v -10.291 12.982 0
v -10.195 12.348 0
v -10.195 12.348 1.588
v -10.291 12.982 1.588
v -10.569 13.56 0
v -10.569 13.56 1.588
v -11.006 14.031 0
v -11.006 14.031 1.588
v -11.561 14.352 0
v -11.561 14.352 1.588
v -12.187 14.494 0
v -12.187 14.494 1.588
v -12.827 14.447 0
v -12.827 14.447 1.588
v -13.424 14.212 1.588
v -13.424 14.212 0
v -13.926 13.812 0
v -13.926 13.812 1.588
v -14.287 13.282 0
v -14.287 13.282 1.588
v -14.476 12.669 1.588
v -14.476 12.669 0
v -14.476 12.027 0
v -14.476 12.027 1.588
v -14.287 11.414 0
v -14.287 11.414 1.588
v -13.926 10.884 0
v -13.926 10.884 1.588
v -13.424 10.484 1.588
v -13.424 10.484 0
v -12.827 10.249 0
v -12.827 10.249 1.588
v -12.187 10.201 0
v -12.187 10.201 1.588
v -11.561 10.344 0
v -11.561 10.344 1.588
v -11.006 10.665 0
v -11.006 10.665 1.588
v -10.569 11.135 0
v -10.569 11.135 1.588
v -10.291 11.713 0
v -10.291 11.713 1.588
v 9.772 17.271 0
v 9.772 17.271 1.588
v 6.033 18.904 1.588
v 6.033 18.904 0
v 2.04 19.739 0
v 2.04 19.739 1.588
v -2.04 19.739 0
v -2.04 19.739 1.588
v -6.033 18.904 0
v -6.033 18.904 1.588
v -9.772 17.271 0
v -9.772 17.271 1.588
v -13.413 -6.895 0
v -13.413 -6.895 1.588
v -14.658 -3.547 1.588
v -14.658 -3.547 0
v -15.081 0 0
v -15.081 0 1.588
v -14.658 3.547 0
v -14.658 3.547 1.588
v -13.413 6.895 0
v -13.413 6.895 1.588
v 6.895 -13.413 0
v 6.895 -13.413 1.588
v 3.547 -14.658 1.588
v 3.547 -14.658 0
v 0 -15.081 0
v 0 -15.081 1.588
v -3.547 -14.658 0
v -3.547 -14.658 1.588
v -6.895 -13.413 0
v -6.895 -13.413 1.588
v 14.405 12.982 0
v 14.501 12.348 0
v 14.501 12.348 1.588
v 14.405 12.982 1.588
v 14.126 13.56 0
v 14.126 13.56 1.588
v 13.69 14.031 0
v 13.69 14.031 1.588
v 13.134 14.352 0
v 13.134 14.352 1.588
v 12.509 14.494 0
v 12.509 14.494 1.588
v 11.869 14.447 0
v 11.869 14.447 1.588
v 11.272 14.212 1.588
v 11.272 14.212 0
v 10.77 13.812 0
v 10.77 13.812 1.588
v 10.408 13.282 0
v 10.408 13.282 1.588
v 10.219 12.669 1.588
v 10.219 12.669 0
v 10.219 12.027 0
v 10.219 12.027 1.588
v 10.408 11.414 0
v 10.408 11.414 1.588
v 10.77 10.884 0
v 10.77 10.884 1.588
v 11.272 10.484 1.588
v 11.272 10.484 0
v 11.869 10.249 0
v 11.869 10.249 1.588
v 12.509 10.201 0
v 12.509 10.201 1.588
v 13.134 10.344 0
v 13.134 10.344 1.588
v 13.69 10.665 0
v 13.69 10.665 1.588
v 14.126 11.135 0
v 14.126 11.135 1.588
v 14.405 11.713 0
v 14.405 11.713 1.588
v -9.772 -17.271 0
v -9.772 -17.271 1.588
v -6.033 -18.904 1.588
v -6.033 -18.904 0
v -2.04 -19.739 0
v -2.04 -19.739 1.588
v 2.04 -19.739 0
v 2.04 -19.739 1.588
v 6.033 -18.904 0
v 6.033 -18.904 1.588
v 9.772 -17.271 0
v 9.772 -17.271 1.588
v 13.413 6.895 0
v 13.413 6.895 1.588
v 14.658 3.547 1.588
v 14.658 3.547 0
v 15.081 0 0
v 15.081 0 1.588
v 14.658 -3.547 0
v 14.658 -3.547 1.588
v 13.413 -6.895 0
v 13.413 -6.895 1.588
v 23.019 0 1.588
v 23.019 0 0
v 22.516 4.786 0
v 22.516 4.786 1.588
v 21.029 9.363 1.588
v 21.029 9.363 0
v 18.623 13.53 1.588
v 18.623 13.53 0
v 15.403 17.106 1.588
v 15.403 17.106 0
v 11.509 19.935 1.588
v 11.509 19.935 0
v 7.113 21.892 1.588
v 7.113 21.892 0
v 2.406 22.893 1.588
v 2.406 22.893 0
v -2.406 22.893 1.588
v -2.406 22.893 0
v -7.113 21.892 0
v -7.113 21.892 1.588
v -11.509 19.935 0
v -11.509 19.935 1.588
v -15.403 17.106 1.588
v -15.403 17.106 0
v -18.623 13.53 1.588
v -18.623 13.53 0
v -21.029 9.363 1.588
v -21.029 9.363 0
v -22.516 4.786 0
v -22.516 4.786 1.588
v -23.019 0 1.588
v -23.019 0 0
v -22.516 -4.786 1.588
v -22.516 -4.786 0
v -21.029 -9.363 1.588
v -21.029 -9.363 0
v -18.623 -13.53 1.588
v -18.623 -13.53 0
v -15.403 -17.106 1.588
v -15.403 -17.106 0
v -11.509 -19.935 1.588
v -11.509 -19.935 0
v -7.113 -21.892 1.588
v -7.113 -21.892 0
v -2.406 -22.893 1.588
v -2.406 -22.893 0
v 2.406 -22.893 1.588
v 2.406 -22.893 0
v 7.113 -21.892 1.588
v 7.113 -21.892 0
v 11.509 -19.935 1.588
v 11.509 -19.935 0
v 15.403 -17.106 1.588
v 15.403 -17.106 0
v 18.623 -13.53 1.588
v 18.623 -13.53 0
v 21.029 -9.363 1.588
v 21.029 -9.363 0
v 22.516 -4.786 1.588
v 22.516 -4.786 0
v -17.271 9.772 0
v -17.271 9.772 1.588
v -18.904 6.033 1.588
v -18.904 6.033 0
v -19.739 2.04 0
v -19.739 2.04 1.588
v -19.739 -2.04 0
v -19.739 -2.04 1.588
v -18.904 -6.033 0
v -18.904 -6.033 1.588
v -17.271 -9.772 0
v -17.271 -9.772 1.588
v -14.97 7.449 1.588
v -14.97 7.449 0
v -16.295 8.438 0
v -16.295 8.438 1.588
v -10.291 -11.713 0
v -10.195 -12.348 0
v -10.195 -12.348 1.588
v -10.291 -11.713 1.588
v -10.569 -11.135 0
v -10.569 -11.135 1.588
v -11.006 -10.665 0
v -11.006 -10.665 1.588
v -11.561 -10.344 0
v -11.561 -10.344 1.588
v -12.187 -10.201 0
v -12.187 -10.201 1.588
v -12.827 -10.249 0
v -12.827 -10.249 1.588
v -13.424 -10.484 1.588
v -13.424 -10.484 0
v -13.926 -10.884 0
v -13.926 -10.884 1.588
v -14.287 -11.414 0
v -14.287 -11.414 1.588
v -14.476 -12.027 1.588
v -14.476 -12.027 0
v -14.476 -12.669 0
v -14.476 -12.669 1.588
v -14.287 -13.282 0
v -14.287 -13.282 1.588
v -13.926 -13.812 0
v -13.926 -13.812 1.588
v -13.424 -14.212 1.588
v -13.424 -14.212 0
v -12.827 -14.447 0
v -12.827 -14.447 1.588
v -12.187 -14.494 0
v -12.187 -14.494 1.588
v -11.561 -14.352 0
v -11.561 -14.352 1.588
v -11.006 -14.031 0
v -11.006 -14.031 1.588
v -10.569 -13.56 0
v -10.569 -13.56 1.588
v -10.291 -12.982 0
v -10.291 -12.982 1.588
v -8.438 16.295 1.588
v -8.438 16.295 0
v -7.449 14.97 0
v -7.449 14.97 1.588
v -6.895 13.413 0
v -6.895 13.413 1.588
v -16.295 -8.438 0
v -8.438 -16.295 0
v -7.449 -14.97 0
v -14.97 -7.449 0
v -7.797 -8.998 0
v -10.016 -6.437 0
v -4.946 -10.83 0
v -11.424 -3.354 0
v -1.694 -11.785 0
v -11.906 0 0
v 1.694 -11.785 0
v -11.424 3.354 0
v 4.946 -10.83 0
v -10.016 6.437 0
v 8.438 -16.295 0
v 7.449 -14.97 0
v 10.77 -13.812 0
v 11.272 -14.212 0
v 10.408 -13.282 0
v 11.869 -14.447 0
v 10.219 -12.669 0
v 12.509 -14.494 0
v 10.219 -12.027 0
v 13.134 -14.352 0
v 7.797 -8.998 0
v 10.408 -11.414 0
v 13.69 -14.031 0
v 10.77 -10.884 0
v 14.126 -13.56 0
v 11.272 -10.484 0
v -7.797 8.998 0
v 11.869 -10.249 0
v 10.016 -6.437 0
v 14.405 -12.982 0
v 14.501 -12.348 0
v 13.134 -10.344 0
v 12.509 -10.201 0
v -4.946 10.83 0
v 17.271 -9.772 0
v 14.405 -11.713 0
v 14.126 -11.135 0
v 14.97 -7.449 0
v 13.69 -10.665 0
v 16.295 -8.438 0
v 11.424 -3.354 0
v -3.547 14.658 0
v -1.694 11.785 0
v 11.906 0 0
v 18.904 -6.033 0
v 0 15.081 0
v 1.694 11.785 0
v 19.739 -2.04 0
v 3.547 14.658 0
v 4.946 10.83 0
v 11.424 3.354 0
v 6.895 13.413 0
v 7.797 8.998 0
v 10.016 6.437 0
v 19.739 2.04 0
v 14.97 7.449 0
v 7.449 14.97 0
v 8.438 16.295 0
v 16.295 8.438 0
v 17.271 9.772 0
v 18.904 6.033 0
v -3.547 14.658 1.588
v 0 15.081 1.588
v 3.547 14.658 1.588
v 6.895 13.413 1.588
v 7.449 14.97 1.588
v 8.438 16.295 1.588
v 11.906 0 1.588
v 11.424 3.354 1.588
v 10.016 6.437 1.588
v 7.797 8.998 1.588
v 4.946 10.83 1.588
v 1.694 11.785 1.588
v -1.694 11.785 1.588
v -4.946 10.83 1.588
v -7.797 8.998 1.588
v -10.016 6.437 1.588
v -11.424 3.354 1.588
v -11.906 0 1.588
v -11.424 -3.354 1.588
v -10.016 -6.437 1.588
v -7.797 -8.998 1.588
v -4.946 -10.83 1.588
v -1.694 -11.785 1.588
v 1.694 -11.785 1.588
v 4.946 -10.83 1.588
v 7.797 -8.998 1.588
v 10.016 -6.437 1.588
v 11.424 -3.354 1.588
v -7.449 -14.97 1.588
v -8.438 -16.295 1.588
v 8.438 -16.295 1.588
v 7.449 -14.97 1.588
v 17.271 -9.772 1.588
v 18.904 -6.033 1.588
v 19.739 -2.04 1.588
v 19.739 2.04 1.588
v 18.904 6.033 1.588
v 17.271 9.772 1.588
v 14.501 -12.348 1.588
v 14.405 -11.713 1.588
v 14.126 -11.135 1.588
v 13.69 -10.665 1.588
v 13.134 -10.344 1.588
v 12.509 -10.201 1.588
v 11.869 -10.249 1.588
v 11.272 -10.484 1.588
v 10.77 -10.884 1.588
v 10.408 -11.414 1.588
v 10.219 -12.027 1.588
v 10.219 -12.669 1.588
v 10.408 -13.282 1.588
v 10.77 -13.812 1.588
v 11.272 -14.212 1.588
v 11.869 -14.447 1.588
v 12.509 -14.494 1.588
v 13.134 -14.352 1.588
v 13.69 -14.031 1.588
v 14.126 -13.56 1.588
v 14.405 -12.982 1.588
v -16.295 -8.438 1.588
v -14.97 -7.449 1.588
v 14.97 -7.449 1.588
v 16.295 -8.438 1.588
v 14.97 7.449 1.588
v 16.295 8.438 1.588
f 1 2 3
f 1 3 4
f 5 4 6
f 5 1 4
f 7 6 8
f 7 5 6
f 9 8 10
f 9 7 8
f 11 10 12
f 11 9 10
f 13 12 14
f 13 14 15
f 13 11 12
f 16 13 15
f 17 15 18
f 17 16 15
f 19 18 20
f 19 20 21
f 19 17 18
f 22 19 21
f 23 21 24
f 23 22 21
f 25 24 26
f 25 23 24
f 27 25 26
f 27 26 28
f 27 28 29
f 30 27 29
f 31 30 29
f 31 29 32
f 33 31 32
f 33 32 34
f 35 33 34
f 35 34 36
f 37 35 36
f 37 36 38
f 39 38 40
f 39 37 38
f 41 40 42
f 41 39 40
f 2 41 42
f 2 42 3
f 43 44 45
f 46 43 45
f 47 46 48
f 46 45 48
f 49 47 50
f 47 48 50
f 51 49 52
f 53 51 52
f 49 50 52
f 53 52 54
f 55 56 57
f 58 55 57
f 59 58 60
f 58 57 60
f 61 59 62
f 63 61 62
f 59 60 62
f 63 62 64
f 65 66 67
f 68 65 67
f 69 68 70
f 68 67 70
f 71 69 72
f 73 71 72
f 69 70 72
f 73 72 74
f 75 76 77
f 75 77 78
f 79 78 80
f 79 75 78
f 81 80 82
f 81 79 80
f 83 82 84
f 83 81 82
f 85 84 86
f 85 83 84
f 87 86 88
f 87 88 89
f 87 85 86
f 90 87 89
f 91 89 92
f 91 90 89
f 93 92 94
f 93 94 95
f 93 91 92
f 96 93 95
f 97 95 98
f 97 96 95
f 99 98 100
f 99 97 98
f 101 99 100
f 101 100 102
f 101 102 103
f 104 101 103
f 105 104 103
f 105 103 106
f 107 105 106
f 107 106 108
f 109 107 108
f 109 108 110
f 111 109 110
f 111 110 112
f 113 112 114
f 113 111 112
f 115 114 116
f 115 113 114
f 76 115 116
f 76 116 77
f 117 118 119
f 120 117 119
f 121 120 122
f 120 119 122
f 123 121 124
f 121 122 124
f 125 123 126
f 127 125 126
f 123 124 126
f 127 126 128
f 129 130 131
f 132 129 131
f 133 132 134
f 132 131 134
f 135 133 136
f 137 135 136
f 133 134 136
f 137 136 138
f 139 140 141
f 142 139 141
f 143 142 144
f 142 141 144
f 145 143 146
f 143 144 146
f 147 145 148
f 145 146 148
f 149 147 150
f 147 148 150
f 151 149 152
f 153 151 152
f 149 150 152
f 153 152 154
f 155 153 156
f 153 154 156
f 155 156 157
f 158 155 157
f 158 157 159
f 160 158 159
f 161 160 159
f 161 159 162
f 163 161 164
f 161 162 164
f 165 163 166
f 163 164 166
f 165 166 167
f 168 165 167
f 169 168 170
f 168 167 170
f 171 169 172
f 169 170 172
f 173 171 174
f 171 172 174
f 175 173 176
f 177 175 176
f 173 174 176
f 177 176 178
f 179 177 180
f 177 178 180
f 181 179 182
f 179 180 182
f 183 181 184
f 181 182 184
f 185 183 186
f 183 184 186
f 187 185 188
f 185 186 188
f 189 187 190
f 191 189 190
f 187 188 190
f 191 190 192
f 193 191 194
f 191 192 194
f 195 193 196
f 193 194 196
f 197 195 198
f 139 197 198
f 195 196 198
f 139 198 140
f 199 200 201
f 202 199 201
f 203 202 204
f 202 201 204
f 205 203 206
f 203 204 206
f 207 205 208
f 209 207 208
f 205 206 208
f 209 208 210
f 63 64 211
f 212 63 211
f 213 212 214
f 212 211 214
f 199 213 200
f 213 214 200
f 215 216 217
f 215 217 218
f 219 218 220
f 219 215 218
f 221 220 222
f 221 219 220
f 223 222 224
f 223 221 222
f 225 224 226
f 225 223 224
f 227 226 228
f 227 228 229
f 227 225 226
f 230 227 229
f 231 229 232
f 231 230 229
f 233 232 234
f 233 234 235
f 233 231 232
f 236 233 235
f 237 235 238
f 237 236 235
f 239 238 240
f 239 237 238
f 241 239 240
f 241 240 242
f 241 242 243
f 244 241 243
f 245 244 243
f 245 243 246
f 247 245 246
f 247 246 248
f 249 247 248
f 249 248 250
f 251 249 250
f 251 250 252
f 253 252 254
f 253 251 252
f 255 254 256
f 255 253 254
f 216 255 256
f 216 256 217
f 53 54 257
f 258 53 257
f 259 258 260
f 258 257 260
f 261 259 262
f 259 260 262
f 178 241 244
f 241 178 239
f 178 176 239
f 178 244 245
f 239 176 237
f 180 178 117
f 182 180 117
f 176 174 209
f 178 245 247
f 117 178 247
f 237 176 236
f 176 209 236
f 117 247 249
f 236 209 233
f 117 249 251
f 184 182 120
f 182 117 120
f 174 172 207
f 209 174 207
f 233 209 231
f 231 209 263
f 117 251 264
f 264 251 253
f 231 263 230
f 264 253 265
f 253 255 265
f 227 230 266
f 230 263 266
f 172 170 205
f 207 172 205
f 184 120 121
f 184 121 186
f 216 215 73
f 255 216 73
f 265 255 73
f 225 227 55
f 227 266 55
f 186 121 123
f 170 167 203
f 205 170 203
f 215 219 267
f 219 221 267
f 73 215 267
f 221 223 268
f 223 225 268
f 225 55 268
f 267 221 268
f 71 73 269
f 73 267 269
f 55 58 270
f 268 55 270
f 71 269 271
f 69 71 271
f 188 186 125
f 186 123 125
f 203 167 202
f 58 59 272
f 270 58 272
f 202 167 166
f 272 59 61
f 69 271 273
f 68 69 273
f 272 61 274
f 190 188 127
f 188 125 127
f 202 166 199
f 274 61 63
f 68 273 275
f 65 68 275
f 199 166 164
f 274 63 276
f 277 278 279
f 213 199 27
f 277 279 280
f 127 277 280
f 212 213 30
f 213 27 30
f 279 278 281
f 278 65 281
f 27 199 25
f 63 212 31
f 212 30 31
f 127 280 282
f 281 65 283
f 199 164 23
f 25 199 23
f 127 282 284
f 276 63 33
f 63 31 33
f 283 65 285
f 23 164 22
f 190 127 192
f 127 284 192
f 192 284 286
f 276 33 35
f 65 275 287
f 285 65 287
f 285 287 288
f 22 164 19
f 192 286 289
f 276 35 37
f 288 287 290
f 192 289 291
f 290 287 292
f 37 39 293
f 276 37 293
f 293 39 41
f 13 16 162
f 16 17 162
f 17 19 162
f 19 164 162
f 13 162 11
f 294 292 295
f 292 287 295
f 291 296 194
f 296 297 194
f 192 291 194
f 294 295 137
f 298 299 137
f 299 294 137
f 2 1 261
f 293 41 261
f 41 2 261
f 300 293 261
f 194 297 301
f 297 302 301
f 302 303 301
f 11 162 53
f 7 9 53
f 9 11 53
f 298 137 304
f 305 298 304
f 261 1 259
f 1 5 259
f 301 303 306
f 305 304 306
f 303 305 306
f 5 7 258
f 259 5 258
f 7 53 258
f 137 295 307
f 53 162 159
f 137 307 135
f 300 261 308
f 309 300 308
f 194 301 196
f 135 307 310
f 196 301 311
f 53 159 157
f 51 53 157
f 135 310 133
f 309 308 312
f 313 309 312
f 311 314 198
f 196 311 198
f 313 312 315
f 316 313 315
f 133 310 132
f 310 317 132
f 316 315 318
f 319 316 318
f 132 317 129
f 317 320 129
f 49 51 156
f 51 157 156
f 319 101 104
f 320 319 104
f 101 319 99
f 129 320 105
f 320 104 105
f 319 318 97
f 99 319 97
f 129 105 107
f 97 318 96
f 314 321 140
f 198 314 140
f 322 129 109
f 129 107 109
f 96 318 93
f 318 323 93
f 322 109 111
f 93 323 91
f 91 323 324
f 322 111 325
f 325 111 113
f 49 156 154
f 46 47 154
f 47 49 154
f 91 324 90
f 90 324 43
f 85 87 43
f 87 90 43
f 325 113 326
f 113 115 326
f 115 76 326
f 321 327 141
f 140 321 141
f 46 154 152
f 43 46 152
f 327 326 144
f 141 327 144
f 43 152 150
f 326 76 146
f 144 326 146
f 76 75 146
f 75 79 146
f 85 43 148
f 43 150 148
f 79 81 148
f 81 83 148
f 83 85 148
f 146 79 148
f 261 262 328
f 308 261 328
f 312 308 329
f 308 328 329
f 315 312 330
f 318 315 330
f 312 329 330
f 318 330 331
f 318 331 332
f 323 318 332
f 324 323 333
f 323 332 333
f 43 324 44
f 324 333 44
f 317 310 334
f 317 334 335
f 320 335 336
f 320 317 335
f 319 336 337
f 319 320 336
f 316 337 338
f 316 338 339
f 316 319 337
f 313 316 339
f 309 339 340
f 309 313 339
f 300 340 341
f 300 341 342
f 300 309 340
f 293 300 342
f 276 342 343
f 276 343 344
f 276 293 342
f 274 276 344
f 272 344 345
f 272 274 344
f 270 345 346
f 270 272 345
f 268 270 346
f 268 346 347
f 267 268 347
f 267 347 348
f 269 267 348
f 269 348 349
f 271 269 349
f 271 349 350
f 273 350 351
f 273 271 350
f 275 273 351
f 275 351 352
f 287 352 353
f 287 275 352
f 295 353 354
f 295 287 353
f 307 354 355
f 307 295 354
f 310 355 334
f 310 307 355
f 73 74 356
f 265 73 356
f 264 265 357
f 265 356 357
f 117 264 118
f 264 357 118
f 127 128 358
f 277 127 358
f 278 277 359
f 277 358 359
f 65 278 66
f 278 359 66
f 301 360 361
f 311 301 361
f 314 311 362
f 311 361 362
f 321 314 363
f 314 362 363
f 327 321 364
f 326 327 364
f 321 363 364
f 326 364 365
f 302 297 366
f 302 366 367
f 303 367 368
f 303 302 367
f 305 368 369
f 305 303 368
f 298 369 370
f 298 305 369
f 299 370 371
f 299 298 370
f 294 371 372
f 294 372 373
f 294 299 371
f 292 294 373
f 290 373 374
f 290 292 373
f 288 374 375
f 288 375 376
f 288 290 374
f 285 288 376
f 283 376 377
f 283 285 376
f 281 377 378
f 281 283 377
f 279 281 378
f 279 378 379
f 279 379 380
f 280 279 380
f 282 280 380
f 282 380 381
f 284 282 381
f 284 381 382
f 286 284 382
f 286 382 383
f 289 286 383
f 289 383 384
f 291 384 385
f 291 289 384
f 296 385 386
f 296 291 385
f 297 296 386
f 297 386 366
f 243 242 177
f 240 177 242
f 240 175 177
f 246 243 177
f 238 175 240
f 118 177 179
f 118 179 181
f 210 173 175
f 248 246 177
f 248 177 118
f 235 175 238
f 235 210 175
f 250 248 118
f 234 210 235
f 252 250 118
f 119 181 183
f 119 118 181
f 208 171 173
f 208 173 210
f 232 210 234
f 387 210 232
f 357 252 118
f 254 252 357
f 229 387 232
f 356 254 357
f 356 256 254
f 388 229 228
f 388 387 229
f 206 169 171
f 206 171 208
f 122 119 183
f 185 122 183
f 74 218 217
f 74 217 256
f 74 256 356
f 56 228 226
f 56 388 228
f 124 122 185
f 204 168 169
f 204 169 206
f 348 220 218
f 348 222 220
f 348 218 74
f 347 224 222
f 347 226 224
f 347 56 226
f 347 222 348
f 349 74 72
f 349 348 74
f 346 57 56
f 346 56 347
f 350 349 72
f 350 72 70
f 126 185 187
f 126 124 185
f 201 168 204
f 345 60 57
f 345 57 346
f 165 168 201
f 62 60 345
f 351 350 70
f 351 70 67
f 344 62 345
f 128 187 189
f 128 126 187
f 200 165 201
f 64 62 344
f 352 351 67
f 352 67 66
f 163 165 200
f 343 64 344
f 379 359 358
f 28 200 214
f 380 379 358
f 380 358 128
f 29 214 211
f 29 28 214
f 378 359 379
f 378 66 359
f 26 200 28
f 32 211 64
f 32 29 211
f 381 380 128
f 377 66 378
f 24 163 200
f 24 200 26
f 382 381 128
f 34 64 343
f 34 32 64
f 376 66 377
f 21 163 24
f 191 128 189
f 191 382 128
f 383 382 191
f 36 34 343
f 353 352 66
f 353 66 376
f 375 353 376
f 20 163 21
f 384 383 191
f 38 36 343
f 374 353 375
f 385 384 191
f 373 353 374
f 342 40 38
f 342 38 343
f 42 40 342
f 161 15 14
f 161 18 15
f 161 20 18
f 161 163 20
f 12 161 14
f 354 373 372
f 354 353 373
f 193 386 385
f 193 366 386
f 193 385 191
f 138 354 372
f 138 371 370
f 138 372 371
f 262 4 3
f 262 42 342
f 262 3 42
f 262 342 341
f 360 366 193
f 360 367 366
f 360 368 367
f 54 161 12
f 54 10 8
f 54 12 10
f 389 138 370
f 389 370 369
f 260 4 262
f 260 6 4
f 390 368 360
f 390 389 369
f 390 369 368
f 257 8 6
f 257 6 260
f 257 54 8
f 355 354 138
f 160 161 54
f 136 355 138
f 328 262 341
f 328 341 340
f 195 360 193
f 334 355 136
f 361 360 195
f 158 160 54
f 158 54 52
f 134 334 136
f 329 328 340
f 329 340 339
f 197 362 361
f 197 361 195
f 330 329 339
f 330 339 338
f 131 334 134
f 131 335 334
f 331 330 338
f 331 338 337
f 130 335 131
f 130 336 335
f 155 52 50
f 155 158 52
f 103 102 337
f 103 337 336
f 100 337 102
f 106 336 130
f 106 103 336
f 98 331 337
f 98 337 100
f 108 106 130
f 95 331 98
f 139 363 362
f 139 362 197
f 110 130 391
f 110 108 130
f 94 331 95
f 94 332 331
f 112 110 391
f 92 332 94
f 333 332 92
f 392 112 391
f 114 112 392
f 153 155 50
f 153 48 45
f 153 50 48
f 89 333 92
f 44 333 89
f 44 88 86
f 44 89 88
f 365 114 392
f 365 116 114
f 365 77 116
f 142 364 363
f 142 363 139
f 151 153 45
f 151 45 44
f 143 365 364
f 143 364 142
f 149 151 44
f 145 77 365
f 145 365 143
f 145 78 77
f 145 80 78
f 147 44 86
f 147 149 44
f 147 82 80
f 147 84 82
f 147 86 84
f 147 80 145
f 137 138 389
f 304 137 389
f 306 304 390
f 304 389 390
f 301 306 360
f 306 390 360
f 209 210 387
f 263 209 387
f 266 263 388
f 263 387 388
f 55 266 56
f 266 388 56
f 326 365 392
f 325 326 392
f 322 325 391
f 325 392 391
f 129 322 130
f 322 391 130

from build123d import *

# Parameters (mm, degrees)
F0_R            = 23.01875
F0_R_2          = 2.15265
F0_R_3          = 11.90625
F1_DEPTH        = 1.5875
F3_DEPTH        = 1.5875
F3_COPIES_COUNT = 4


# Not quite as in the source:
# - a pattern or mirror of a feature is missing from the dataset's text; its kind, count and spacing are read off the source's solid


with BuildPart() as f1:
    # F0 (on Top) → F1 (new body)
    with BuildSketch(Plane.XY):
        Circle(F0_R)
        with Locations((-12.3478521665, -12.3478521665)):
            Circle(F0_R_2, mode=Mode.SUBTRACT)
        with Locations((12.3478521665, -12.3478521665)):
            Circle(F0_R_2, mode=Mode.SUBTRACT)
        with Locations((-12.3478521665, 12.3478521665)):
            Circle(F0_R_2, mode=Mode.SUBTRACT)
        Circle(F0_R_3, mode=Mode.SUBTRACT)
        with Locations((12.3478521665, 12.3478521665)):
            Circle(F0_R_2, mode=Mode.SUBTRACT)
    extrude(amount=F1_DEPTH)

    # F2 (on face) → F3 (cut, through all)
    with BuildSketch(Plane.XY.offset(1.5875)):
        with BuildLine():
            ThreePointArc((-9.7719120136, 17.2709047146), (-7.8938999882, 15.6696324205), (-6.8946489019, 13.4129757356))
            ThreePointArc((-6.8946489019, 13.4129757356), (0, 15.08125), (6.8946489019, 13.4129757356))
            ThreePointArc((6.8946489019, 13.4129757356), (7.8938999882, 15.6696324205), (9.7719120136, 17.2709047146))
            ThreePointArc((9.7719120136, 17.2709047146), (0, 19.84375), (-9.7719120136, 17.2709047146))
        make_face()
    f3 = extrude(amount=-F3_DEPTH, mode=Mode.SUBTRACT)

    # F3_copies: F3 ×4 about axis
    f3_copies_axis = Axis((0, 0, 0), (0, 0, 1))
    for i in range(1, F3_COPIES_COUNT):
        add(f3.rotate(f3_copies_axis, i * 360 / F3_COPIES_COUNT), mode=Mode.SUBTRACT)


solid = f1.part
